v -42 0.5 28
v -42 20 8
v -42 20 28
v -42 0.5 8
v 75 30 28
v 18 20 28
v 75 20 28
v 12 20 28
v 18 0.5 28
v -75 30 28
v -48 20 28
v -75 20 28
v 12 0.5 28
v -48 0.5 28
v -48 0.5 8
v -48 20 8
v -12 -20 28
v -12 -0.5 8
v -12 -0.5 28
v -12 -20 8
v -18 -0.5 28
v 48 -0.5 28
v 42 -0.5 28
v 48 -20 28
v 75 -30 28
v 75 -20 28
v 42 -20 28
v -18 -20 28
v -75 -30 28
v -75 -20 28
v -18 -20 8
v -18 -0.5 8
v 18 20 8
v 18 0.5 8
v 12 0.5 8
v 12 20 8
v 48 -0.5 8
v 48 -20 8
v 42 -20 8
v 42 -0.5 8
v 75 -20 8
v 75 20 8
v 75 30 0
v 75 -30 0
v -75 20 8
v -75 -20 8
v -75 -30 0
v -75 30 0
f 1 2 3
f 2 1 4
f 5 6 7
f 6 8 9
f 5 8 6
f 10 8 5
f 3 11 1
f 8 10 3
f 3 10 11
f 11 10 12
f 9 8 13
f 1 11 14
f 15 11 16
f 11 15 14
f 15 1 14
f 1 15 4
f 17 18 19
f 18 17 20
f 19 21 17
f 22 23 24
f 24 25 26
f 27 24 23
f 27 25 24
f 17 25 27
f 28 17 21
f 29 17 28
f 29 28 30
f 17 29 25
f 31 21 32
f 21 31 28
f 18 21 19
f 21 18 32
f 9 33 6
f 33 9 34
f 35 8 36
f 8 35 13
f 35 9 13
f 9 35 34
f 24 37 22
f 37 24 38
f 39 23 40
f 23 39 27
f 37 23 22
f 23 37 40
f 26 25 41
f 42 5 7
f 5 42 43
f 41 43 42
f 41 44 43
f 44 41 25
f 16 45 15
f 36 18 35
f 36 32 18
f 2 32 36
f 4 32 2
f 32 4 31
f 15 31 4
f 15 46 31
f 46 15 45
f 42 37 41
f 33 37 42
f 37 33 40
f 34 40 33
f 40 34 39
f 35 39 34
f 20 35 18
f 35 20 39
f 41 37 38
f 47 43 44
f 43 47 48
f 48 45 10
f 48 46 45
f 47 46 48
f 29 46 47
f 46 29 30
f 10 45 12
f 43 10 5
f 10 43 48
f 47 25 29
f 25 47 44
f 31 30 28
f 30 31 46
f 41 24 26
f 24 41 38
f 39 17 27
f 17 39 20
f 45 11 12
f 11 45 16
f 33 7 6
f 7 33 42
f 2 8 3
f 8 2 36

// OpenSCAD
$fn = 32;

// ----------------------------------------------------------------------
// Rib frame 150 x 60 x 28
// 4 ribs at 30 mm pitch, staggered
// ----------------------------------------------------------------------

// --- parameters (mm) ---
frame = [150, 60, 8];  // base plate size (x, y, z)
rail_w = 10;           // side rail width
ribs = 4;              // number of ribs
rib_t = 6;             // rib thickness
rib_h = 20;            // rib height above the base plate
pitch = 30;            // pitch between rib centres

// --- derived feature positions (mm) ---
span = (ribs - 1) * pitch;          // = 90   distance between the outer ribs
origin_x = -span / 2;               // = -45   X of the first rib
rib_len = frame[1] / 2 - rail_w + 0.5;  // = 20.5   length of a staggered rib
rib_y = 0.5 + rib_len / 2;          // = 10.75   Y of a staggered rib centre
row_offset = 2 * rib_y;             // = 21.5   distance between the two rows
feature_centers = [
  [origin_x + 0 * pitch, rib_y],
  [origin_x + 1 * pitch, -rib_y],
  [origin_x + 2 * pitch, rib_y],
  [origin_x + 3 * pitch, -rib_y]
];   // rib centre line, drives the rib loop

// base plate, two side rails, then the ribs read straight off feature_centers
union() {
  translate([-frame[0] / 2, -frame[1] / 2, 0]) cube(frame);
  translate([-frame[0] / 2, -frame[1] / 2, 0]) cube([frame[0], rail_w, frame[2] + rib_h]);
  translate([-frame[0] / 2, frame[1] / 2 - rail_w, 0]) cube([frame[0], rail_w, frame[2] + rib_h]);
  for (centre = feature_centers)
    translate([centre[0] - rib_t / 2, centre[1] - rib_len / 2, frame[2] - 1])
      cube([rib_t, rib_len, rib_h + 1]);
}
